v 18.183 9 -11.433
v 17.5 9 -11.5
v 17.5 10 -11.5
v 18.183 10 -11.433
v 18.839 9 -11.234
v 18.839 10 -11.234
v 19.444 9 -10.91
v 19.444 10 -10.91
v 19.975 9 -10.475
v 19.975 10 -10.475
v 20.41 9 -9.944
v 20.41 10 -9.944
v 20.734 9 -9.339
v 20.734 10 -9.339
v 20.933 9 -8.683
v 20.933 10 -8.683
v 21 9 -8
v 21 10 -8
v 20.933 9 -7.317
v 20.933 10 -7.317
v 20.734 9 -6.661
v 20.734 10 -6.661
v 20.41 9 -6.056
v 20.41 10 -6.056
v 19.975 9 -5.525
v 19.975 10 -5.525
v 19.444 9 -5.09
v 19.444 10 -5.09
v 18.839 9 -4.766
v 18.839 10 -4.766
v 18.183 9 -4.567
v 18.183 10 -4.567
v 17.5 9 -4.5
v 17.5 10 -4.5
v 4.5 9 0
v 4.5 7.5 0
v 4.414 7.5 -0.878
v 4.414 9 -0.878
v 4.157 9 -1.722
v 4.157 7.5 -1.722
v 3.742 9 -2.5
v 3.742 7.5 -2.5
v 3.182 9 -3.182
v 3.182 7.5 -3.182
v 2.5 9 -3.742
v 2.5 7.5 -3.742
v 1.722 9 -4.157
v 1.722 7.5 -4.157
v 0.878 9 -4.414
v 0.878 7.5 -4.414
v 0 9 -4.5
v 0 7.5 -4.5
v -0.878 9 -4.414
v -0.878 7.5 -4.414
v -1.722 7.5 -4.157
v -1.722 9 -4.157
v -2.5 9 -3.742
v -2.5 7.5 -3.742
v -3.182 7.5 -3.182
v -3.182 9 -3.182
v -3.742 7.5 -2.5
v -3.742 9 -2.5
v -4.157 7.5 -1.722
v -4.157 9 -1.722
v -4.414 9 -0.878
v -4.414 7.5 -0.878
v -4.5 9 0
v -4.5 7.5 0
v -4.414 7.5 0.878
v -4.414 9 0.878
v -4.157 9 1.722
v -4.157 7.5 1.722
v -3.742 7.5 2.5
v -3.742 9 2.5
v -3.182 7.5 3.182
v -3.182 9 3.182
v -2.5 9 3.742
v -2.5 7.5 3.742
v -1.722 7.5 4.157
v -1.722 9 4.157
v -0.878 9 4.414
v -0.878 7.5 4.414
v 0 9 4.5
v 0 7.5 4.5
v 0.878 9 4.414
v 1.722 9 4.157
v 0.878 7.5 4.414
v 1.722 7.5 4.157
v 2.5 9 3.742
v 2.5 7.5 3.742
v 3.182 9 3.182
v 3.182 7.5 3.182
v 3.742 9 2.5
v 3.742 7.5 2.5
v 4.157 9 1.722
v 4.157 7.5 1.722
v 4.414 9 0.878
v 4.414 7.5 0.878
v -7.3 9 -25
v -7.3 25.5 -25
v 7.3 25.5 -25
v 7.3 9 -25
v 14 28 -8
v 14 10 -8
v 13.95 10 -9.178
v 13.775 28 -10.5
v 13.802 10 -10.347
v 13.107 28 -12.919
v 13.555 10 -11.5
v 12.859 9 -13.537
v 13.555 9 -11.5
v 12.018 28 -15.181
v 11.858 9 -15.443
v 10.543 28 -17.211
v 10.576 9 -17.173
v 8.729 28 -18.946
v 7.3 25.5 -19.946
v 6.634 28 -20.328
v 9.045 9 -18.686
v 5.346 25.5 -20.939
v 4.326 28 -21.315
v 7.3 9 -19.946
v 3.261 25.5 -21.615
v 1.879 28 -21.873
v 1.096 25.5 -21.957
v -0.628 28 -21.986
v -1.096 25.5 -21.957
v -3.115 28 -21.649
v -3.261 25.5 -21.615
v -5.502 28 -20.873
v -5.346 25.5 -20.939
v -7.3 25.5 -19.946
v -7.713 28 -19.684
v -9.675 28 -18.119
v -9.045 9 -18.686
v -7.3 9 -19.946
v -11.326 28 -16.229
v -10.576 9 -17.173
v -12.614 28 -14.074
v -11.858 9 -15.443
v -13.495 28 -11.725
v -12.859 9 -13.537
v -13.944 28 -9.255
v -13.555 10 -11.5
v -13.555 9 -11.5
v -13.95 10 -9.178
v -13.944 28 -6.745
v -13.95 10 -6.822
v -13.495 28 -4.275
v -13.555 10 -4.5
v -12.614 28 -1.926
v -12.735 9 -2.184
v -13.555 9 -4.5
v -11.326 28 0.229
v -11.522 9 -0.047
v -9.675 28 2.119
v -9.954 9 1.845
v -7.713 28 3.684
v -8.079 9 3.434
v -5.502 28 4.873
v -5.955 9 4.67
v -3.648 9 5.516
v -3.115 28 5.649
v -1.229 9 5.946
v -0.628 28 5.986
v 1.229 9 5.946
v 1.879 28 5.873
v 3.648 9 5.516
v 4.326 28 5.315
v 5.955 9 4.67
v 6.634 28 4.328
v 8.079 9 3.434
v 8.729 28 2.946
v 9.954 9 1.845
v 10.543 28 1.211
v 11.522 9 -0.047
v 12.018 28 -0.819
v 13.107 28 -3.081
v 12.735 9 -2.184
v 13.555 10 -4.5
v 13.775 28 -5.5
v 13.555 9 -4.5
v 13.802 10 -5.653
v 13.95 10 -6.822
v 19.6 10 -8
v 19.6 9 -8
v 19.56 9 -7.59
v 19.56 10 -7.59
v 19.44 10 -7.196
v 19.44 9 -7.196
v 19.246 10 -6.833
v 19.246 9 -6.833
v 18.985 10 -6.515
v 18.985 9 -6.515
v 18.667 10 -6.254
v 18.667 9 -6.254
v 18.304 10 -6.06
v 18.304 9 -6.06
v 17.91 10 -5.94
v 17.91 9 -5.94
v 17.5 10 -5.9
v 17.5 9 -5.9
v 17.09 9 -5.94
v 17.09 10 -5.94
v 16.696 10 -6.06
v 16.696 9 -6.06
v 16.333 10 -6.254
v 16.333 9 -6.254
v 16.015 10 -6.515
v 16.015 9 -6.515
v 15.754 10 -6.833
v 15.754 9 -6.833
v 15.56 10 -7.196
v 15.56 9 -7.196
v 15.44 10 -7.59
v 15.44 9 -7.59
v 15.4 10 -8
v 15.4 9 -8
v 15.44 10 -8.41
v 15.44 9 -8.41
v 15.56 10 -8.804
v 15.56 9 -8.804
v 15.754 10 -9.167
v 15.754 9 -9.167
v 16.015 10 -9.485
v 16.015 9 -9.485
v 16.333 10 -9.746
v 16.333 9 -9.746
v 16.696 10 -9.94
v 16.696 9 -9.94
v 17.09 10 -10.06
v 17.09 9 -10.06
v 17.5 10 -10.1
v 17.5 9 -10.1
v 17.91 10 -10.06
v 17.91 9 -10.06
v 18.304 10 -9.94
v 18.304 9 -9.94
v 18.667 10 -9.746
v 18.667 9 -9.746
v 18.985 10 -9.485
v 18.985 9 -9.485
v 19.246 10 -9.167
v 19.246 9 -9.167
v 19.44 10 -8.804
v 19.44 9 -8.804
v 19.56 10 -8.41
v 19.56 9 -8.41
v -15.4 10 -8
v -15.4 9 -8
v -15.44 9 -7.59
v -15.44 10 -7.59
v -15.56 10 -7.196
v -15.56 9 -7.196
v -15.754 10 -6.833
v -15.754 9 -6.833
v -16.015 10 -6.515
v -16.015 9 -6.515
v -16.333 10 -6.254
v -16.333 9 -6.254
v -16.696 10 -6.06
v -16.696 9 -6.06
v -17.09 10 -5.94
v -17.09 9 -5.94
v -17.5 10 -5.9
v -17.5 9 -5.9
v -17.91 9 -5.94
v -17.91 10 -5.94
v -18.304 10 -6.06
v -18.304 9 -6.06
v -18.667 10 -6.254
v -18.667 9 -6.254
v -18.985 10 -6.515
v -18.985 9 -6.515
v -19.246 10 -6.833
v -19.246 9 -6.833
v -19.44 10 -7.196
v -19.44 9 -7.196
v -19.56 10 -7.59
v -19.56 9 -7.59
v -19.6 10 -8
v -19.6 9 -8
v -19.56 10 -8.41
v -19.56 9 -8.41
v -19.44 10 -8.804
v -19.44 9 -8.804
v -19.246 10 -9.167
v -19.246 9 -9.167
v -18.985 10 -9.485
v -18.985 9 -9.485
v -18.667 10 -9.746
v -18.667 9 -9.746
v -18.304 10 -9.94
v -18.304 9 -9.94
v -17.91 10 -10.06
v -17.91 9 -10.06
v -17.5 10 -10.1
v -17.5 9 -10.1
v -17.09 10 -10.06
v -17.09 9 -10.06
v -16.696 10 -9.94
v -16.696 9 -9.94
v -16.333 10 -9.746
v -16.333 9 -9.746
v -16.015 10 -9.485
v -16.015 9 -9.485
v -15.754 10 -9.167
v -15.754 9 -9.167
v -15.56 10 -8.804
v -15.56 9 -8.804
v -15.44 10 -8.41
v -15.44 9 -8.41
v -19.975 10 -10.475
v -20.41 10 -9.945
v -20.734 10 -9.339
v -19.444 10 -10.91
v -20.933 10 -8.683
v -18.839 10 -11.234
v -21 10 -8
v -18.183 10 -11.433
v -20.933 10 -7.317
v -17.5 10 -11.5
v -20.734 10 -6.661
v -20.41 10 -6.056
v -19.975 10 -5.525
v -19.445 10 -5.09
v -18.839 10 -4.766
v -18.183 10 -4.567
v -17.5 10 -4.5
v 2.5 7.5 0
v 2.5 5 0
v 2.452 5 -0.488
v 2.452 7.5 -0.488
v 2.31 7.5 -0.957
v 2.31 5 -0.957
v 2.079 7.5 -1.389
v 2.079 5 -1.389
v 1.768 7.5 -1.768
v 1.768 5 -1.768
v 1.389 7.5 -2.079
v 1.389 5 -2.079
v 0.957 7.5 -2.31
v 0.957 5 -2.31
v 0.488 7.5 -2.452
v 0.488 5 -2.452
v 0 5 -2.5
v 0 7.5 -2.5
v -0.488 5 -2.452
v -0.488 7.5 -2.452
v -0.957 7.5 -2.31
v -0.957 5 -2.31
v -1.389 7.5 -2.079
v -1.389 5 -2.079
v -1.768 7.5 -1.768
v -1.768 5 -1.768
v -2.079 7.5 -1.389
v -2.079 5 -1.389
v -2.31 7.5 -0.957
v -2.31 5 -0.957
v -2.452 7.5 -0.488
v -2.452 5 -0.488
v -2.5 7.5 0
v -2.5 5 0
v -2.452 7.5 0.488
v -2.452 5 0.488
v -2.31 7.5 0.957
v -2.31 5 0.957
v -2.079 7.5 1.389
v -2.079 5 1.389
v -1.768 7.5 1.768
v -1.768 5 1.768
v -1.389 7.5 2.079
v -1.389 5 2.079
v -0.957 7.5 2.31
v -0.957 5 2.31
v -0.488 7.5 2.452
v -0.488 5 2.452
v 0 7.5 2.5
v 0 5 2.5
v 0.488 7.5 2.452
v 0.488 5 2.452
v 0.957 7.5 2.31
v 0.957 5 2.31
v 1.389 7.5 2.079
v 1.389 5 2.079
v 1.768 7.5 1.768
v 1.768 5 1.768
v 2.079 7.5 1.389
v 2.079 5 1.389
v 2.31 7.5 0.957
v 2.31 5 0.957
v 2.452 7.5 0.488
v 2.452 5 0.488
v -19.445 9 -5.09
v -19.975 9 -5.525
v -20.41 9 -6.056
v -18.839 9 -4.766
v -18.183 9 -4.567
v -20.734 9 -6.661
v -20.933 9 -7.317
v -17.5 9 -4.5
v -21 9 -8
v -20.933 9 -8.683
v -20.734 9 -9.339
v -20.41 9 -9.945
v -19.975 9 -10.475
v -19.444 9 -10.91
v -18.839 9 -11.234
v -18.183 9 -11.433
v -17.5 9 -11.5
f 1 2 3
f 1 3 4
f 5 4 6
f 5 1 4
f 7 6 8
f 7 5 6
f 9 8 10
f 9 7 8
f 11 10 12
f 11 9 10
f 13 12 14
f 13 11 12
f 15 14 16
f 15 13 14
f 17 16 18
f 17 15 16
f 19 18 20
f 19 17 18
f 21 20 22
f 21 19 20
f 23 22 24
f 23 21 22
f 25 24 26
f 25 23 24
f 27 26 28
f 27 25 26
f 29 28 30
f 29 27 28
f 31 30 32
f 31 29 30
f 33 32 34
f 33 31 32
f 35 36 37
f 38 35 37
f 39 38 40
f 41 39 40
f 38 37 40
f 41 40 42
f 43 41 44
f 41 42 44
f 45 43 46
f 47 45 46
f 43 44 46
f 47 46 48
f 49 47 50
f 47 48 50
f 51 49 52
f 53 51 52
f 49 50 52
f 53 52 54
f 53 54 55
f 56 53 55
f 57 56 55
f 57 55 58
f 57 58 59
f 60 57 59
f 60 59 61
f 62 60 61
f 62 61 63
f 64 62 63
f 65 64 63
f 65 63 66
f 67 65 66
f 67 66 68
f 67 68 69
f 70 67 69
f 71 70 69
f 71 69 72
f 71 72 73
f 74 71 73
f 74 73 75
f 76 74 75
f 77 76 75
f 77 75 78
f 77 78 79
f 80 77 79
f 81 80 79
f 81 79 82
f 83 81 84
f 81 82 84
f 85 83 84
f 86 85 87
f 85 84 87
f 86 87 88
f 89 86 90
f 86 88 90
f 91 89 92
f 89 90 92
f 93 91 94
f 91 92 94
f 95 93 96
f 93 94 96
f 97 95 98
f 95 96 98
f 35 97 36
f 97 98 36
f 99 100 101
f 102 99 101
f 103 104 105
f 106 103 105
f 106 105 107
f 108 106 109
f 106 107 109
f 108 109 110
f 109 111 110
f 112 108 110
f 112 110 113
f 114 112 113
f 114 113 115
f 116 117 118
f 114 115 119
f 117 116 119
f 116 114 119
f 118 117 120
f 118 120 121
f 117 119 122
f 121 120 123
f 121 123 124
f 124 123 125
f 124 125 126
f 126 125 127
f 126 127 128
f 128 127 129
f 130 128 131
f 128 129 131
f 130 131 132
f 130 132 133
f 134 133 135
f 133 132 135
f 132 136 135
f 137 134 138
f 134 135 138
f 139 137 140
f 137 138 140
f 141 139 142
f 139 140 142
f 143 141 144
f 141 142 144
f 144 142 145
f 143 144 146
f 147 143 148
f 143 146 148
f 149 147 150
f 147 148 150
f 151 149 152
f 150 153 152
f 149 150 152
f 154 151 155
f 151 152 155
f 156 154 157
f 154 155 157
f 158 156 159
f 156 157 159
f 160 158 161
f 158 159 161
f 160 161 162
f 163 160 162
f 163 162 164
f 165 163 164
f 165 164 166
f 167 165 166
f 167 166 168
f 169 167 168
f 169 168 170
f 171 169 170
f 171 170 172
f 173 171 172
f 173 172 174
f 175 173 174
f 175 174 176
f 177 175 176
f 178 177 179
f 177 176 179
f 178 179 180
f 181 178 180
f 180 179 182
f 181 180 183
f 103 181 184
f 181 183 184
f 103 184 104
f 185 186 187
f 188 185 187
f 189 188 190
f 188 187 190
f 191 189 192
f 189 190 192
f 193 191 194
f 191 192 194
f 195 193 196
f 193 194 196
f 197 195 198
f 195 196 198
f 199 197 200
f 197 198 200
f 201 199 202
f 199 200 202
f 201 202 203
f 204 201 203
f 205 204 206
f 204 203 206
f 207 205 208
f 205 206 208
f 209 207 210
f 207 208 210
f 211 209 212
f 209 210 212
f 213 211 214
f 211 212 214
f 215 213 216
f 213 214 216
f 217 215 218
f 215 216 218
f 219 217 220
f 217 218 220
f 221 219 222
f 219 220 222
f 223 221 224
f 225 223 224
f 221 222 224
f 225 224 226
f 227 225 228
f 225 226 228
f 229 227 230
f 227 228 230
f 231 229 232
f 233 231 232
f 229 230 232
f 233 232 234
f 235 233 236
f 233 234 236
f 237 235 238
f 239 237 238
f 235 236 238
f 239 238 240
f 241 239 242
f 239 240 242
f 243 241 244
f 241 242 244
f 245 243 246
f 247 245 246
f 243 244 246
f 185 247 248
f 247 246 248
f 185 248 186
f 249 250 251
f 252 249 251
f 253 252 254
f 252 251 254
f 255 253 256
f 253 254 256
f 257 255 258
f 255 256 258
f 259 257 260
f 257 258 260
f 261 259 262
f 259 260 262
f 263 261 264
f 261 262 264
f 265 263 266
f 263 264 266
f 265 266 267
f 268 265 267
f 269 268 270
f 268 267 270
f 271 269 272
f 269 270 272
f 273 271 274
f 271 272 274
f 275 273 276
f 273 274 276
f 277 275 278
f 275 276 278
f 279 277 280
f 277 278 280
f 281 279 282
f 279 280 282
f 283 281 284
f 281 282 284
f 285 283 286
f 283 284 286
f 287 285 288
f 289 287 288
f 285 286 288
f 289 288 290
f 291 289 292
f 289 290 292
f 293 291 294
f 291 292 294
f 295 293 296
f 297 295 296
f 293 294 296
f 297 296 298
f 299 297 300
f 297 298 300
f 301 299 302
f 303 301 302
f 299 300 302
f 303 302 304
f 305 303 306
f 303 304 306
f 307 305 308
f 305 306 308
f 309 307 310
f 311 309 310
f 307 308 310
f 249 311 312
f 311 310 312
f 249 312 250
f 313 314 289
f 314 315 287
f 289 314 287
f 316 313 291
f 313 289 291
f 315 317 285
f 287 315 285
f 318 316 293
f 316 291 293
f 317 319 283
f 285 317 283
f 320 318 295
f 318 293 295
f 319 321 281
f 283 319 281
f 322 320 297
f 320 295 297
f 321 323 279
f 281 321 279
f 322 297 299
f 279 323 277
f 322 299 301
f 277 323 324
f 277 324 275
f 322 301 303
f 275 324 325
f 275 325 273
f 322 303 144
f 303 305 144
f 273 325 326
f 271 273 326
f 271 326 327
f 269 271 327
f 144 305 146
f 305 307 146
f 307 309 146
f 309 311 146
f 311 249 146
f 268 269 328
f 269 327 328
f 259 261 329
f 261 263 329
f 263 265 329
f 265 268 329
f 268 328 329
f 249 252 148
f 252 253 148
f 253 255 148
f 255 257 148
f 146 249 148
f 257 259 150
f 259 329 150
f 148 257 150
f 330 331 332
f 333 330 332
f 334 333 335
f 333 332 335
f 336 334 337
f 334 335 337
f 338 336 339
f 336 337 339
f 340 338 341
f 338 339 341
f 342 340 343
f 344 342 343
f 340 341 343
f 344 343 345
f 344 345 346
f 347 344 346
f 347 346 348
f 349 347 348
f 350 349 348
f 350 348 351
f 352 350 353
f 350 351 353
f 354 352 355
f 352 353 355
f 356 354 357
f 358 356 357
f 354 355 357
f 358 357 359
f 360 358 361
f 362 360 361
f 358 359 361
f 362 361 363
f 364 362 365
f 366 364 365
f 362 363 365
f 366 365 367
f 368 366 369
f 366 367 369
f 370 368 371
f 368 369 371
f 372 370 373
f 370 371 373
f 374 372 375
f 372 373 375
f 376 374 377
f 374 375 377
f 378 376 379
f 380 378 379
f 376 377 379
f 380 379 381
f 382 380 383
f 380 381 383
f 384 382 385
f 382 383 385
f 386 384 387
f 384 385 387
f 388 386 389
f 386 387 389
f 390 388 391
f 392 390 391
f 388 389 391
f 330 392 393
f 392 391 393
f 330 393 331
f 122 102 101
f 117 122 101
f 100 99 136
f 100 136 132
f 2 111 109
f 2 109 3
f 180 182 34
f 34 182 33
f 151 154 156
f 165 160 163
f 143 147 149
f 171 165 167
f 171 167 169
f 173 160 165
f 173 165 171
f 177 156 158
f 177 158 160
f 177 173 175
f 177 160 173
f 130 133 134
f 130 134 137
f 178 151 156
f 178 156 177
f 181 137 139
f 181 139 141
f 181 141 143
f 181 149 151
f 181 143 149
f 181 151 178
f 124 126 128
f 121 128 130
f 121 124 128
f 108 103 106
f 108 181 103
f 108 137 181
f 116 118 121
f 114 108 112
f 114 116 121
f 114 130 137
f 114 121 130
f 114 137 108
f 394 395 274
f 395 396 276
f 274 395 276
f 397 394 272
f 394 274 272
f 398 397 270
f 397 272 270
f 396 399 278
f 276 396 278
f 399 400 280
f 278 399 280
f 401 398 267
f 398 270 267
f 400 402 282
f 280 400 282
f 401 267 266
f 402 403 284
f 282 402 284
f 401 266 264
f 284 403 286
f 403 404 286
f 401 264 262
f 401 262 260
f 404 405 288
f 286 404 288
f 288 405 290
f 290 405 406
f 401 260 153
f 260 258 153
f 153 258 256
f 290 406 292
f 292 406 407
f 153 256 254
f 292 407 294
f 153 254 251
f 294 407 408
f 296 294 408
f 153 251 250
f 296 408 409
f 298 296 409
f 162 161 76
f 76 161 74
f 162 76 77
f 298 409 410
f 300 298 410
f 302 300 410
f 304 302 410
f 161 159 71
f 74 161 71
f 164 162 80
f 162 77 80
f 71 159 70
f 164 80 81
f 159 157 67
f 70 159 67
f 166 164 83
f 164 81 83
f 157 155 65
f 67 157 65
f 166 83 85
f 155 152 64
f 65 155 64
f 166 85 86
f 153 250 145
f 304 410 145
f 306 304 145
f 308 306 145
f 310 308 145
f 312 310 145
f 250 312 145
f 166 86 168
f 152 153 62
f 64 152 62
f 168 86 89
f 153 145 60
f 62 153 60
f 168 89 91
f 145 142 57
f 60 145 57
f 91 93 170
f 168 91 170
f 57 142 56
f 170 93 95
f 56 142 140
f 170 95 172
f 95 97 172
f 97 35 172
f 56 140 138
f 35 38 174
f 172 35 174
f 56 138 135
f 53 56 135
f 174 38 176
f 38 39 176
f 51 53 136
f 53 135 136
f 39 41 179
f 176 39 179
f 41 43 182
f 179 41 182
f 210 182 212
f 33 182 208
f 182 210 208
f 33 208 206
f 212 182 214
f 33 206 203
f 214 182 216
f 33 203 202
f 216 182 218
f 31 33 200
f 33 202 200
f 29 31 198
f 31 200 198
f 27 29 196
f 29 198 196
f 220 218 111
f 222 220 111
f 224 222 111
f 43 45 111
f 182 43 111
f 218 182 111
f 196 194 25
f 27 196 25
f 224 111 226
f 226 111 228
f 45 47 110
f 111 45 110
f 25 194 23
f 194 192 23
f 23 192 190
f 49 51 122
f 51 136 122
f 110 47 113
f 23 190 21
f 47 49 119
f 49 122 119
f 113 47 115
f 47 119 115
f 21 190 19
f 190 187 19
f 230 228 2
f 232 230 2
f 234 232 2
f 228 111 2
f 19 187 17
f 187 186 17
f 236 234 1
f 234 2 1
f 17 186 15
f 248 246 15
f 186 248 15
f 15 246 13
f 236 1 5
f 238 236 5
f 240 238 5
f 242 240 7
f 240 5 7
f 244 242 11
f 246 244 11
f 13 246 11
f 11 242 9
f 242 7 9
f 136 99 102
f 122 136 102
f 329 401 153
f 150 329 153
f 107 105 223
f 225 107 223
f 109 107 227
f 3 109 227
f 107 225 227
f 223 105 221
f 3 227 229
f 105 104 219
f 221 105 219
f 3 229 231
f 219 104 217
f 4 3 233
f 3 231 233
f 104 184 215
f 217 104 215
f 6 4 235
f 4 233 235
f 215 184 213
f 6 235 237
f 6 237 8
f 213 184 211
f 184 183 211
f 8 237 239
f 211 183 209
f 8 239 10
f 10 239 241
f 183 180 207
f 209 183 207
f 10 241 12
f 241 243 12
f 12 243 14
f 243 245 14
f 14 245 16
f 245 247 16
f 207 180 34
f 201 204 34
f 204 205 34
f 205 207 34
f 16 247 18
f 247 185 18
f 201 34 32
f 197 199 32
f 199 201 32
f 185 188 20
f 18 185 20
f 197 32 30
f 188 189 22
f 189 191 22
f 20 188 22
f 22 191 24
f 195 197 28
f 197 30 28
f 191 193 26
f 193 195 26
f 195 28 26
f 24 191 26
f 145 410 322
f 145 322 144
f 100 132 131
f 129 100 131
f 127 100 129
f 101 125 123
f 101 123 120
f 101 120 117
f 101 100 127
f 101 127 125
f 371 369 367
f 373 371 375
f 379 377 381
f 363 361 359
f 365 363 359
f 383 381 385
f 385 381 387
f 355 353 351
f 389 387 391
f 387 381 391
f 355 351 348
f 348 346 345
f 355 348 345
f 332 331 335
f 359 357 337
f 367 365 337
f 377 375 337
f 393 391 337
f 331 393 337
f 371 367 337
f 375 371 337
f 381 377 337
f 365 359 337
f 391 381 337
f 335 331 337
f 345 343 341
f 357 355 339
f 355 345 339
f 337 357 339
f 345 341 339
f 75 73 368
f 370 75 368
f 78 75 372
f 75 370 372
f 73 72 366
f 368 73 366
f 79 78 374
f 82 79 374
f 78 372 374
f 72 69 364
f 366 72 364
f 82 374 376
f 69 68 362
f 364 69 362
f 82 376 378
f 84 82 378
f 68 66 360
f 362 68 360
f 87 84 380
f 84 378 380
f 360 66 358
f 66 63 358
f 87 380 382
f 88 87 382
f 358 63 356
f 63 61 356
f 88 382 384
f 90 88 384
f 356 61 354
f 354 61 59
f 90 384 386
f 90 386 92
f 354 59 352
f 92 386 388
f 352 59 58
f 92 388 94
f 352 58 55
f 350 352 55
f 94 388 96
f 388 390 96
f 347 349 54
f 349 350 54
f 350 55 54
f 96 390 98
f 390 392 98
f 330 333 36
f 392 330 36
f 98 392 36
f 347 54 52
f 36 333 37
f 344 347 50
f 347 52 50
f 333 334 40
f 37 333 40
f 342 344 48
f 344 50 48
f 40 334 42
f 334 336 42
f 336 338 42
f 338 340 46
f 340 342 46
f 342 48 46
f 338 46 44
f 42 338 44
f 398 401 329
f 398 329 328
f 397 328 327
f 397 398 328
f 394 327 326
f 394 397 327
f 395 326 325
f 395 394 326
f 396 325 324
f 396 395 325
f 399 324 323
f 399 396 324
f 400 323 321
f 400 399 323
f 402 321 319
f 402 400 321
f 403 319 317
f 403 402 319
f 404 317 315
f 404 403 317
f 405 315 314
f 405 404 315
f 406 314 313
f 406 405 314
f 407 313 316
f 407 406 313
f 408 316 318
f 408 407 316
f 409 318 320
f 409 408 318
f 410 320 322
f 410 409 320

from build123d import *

# Parameters (mm, degrees)
CYLINDER004_R     = 2.5
CYLINDER004_DEPTH = 2.5
CYLINDER003_R     = 14
CYLINDER003_DEPTH = 19
SKETCH_R          = 2.1
EXTRUDE002_DEPTH  = 1
BOX003_W          = 14.6
BOX003_H          = 16.5
BOX003_DEPTH      = 17
CYLINDER002_R     = 4.5
CYLINDER002_DEPTH = 1.5


with BuildPart() as motor_shaft_part:
    # Cylinder004 → Cylinder004 (new body)
    with BuildSketch(Plane(origin=(0, -4, 8), x_dir=(1, 0, 0), z_dir=(0, 1, 0))):
        Circle(CYLINDER004_R)
    extrude(amount=CYLINDER004_DEPTH)


with BuildPart() as motor_body:
    # Cylinder003 → Cylinder003 (new body)
    with BuildSketch(Plane(origin=(0, 0, 0), x_dir=(1, 0, 0), z_dir=(0, 1, 0))):
        Circle(CYLINDER003_R)
    extrude(amount=CYLINDER003_DEPTH)


with BuildPart() as motor_bracket:
    # Sketch → Extrude002 (new body)
    with BuildSketch(Plane.XZ):
        with BuildLine():
            ThreePointArc((-17.500018, 3.5), (-21, -1.8e-05), (-17.499982, -3.5))
            Line((-17.499982, -3.5), (17.5, -3.5))
            ThreePointArc((17.5, -3.5), (21, 0), (17.5, 3.5))
            Line((-17.500018, 3.5), (17.5, 3.5))
        make_face()
        with Locations((17.5, 0)):
            Circle(SKETCH_R, mode=Mode.SUBTRACT)
        with Locations((-17.5, 0)):
            Circle(SKETCH_R, mode=Mode.SUBTRACT)
    extrude(amount=-EXTRUDE002_DEPTH)


with BuildPart() as motor_base:
    # Box003 → Box003 (new body)
    with BuildSketch(Plane(origin=(-7.3, 0, -17), x_dir=(1, 0, 0), z_dir=(0, 0, 1))):
        with Locations((7.3, 8.25)):
            Rectangle(BOX003_W, BOX003_H)
    extrude(amount=BOX003_DEPTH)


with BuildPart() as motor:
    # Cylinder002 → Cylinder002 (new body)
    with BuildSketch(Plane(origin=(0, -1.5, 8), x_dir=(1, 0, 0), z_dir=(0, 1, 0))):
        Circle(CYLINDER002_R)
    extrude(amount=CYLINDER002_DEPTH)

    # Fusion003: union motor_shaft_part, motor_body, motor_bracket, motor_base
    add(motor_shaft_part.part)
    add(motor_body.part)
    add(motor_bracket.part)
    add(motor_base.part)


with BuildPart() as motor_1:
    # Fusion003 placement: moved
    add(motor.part.moved(Location((0, 9, -8))))


solid = motor_1.part
